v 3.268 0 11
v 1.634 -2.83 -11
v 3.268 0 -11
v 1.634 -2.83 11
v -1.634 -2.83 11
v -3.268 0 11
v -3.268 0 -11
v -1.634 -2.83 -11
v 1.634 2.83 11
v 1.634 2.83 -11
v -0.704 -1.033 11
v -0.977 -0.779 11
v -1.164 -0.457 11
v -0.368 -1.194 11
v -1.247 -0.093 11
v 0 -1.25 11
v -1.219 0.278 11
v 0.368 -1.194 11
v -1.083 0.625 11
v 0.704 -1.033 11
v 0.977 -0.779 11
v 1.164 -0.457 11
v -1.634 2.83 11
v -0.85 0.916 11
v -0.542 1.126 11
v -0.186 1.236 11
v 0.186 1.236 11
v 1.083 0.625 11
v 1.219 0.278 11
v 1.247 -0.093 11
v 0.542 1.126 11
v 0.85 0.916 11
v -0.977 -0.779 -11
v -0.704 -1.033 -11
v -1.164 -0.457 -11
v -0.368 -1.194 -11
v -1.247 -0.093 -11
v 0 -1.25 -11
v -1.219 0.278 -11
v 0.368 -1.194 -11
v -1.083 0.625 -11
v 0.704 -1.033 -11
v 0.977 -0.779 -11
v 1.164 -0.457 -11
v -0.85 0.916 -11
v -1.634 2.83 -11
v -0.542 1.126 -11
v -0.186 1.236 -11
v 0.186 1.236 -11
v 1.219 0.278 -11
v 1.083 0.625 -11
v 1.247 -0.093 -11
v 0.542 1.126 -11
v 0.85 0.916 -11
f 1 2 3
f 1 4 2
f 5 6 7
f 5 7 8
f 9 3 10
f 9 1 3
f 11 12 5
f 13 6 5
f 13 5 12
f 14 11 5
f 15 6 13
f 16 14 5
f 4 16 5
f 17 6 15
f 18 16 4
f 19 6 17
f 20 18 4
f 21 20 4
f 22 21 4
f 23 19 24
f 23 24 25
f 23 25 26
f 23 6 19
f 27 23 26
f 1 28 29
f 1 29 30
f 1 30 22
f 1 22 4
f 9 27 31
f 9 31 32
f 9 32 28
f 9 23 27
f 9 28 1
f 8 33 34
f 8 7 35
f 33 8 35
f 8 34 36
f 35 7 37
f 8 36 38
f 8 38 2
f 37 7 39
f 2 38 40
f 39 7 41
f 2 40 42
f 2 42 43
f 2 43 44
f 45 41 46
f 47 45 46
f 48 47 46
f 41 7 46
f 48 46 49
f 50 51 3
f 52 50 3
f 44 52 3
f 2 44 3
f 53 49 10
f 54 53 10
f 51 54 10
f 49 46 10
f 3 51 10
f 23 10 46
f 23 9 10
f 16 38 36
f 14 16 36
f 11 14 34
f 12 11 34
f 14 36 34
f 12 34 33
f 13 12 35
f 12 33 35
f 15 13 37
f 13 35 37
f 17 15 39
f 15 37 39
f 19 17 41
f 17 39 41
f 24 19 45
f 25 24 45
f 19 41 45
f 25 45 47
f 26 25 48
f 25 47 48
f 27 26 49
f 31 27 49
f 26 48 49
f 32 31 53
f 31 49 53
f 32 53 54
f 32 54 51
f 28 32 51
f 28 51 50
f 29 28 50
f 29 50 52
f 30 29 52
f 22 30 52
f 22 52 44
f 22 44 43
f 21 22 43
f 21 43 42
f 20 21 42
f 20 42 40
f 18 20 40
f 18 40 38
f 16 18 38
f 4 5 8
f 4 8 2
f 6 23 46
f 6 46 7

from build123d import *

# Parameters (mm, degrees)
EXTRUDE_329_DEPTH = 11


with BuildPart() as part:
    # 草图1 → Extrude 329 (new, symmetric)
    with BuildSketch(Plane.XY):
        Polygon((1.633901262, 2.83), (-1.633901262, 2.83), (-3.267802524, 0), (-1.633901262, -2.83), (1.633901262, -2.83), (3.267802524, 0), align=None)
    extrude(amount=EXTRUDE_329_DEPTH, both=True)

    # 草图3 → 螺纹孔1 (revolve, cut)
    with BuildSketch(Plane(origin=(0, 0, 11), x_dir=(0, -1, 0), z_dir=(1, 0, 0))):
        Polygon((0, 0), (0, 13.951075774), (1.25, 13.2), (1.25, 0), align=None)
    hole_wizard_1 = revolve(axis=Axis((0, 0, 17.35), (0, 0, -1)), mode=Mode.SUBTRACT)

    # 镜向1: 螺纹孔1 across plane
    add(hole_wizard_1.mirror(Plane.XY), mode=Mode.SUBTRACT)


solid = part.part
